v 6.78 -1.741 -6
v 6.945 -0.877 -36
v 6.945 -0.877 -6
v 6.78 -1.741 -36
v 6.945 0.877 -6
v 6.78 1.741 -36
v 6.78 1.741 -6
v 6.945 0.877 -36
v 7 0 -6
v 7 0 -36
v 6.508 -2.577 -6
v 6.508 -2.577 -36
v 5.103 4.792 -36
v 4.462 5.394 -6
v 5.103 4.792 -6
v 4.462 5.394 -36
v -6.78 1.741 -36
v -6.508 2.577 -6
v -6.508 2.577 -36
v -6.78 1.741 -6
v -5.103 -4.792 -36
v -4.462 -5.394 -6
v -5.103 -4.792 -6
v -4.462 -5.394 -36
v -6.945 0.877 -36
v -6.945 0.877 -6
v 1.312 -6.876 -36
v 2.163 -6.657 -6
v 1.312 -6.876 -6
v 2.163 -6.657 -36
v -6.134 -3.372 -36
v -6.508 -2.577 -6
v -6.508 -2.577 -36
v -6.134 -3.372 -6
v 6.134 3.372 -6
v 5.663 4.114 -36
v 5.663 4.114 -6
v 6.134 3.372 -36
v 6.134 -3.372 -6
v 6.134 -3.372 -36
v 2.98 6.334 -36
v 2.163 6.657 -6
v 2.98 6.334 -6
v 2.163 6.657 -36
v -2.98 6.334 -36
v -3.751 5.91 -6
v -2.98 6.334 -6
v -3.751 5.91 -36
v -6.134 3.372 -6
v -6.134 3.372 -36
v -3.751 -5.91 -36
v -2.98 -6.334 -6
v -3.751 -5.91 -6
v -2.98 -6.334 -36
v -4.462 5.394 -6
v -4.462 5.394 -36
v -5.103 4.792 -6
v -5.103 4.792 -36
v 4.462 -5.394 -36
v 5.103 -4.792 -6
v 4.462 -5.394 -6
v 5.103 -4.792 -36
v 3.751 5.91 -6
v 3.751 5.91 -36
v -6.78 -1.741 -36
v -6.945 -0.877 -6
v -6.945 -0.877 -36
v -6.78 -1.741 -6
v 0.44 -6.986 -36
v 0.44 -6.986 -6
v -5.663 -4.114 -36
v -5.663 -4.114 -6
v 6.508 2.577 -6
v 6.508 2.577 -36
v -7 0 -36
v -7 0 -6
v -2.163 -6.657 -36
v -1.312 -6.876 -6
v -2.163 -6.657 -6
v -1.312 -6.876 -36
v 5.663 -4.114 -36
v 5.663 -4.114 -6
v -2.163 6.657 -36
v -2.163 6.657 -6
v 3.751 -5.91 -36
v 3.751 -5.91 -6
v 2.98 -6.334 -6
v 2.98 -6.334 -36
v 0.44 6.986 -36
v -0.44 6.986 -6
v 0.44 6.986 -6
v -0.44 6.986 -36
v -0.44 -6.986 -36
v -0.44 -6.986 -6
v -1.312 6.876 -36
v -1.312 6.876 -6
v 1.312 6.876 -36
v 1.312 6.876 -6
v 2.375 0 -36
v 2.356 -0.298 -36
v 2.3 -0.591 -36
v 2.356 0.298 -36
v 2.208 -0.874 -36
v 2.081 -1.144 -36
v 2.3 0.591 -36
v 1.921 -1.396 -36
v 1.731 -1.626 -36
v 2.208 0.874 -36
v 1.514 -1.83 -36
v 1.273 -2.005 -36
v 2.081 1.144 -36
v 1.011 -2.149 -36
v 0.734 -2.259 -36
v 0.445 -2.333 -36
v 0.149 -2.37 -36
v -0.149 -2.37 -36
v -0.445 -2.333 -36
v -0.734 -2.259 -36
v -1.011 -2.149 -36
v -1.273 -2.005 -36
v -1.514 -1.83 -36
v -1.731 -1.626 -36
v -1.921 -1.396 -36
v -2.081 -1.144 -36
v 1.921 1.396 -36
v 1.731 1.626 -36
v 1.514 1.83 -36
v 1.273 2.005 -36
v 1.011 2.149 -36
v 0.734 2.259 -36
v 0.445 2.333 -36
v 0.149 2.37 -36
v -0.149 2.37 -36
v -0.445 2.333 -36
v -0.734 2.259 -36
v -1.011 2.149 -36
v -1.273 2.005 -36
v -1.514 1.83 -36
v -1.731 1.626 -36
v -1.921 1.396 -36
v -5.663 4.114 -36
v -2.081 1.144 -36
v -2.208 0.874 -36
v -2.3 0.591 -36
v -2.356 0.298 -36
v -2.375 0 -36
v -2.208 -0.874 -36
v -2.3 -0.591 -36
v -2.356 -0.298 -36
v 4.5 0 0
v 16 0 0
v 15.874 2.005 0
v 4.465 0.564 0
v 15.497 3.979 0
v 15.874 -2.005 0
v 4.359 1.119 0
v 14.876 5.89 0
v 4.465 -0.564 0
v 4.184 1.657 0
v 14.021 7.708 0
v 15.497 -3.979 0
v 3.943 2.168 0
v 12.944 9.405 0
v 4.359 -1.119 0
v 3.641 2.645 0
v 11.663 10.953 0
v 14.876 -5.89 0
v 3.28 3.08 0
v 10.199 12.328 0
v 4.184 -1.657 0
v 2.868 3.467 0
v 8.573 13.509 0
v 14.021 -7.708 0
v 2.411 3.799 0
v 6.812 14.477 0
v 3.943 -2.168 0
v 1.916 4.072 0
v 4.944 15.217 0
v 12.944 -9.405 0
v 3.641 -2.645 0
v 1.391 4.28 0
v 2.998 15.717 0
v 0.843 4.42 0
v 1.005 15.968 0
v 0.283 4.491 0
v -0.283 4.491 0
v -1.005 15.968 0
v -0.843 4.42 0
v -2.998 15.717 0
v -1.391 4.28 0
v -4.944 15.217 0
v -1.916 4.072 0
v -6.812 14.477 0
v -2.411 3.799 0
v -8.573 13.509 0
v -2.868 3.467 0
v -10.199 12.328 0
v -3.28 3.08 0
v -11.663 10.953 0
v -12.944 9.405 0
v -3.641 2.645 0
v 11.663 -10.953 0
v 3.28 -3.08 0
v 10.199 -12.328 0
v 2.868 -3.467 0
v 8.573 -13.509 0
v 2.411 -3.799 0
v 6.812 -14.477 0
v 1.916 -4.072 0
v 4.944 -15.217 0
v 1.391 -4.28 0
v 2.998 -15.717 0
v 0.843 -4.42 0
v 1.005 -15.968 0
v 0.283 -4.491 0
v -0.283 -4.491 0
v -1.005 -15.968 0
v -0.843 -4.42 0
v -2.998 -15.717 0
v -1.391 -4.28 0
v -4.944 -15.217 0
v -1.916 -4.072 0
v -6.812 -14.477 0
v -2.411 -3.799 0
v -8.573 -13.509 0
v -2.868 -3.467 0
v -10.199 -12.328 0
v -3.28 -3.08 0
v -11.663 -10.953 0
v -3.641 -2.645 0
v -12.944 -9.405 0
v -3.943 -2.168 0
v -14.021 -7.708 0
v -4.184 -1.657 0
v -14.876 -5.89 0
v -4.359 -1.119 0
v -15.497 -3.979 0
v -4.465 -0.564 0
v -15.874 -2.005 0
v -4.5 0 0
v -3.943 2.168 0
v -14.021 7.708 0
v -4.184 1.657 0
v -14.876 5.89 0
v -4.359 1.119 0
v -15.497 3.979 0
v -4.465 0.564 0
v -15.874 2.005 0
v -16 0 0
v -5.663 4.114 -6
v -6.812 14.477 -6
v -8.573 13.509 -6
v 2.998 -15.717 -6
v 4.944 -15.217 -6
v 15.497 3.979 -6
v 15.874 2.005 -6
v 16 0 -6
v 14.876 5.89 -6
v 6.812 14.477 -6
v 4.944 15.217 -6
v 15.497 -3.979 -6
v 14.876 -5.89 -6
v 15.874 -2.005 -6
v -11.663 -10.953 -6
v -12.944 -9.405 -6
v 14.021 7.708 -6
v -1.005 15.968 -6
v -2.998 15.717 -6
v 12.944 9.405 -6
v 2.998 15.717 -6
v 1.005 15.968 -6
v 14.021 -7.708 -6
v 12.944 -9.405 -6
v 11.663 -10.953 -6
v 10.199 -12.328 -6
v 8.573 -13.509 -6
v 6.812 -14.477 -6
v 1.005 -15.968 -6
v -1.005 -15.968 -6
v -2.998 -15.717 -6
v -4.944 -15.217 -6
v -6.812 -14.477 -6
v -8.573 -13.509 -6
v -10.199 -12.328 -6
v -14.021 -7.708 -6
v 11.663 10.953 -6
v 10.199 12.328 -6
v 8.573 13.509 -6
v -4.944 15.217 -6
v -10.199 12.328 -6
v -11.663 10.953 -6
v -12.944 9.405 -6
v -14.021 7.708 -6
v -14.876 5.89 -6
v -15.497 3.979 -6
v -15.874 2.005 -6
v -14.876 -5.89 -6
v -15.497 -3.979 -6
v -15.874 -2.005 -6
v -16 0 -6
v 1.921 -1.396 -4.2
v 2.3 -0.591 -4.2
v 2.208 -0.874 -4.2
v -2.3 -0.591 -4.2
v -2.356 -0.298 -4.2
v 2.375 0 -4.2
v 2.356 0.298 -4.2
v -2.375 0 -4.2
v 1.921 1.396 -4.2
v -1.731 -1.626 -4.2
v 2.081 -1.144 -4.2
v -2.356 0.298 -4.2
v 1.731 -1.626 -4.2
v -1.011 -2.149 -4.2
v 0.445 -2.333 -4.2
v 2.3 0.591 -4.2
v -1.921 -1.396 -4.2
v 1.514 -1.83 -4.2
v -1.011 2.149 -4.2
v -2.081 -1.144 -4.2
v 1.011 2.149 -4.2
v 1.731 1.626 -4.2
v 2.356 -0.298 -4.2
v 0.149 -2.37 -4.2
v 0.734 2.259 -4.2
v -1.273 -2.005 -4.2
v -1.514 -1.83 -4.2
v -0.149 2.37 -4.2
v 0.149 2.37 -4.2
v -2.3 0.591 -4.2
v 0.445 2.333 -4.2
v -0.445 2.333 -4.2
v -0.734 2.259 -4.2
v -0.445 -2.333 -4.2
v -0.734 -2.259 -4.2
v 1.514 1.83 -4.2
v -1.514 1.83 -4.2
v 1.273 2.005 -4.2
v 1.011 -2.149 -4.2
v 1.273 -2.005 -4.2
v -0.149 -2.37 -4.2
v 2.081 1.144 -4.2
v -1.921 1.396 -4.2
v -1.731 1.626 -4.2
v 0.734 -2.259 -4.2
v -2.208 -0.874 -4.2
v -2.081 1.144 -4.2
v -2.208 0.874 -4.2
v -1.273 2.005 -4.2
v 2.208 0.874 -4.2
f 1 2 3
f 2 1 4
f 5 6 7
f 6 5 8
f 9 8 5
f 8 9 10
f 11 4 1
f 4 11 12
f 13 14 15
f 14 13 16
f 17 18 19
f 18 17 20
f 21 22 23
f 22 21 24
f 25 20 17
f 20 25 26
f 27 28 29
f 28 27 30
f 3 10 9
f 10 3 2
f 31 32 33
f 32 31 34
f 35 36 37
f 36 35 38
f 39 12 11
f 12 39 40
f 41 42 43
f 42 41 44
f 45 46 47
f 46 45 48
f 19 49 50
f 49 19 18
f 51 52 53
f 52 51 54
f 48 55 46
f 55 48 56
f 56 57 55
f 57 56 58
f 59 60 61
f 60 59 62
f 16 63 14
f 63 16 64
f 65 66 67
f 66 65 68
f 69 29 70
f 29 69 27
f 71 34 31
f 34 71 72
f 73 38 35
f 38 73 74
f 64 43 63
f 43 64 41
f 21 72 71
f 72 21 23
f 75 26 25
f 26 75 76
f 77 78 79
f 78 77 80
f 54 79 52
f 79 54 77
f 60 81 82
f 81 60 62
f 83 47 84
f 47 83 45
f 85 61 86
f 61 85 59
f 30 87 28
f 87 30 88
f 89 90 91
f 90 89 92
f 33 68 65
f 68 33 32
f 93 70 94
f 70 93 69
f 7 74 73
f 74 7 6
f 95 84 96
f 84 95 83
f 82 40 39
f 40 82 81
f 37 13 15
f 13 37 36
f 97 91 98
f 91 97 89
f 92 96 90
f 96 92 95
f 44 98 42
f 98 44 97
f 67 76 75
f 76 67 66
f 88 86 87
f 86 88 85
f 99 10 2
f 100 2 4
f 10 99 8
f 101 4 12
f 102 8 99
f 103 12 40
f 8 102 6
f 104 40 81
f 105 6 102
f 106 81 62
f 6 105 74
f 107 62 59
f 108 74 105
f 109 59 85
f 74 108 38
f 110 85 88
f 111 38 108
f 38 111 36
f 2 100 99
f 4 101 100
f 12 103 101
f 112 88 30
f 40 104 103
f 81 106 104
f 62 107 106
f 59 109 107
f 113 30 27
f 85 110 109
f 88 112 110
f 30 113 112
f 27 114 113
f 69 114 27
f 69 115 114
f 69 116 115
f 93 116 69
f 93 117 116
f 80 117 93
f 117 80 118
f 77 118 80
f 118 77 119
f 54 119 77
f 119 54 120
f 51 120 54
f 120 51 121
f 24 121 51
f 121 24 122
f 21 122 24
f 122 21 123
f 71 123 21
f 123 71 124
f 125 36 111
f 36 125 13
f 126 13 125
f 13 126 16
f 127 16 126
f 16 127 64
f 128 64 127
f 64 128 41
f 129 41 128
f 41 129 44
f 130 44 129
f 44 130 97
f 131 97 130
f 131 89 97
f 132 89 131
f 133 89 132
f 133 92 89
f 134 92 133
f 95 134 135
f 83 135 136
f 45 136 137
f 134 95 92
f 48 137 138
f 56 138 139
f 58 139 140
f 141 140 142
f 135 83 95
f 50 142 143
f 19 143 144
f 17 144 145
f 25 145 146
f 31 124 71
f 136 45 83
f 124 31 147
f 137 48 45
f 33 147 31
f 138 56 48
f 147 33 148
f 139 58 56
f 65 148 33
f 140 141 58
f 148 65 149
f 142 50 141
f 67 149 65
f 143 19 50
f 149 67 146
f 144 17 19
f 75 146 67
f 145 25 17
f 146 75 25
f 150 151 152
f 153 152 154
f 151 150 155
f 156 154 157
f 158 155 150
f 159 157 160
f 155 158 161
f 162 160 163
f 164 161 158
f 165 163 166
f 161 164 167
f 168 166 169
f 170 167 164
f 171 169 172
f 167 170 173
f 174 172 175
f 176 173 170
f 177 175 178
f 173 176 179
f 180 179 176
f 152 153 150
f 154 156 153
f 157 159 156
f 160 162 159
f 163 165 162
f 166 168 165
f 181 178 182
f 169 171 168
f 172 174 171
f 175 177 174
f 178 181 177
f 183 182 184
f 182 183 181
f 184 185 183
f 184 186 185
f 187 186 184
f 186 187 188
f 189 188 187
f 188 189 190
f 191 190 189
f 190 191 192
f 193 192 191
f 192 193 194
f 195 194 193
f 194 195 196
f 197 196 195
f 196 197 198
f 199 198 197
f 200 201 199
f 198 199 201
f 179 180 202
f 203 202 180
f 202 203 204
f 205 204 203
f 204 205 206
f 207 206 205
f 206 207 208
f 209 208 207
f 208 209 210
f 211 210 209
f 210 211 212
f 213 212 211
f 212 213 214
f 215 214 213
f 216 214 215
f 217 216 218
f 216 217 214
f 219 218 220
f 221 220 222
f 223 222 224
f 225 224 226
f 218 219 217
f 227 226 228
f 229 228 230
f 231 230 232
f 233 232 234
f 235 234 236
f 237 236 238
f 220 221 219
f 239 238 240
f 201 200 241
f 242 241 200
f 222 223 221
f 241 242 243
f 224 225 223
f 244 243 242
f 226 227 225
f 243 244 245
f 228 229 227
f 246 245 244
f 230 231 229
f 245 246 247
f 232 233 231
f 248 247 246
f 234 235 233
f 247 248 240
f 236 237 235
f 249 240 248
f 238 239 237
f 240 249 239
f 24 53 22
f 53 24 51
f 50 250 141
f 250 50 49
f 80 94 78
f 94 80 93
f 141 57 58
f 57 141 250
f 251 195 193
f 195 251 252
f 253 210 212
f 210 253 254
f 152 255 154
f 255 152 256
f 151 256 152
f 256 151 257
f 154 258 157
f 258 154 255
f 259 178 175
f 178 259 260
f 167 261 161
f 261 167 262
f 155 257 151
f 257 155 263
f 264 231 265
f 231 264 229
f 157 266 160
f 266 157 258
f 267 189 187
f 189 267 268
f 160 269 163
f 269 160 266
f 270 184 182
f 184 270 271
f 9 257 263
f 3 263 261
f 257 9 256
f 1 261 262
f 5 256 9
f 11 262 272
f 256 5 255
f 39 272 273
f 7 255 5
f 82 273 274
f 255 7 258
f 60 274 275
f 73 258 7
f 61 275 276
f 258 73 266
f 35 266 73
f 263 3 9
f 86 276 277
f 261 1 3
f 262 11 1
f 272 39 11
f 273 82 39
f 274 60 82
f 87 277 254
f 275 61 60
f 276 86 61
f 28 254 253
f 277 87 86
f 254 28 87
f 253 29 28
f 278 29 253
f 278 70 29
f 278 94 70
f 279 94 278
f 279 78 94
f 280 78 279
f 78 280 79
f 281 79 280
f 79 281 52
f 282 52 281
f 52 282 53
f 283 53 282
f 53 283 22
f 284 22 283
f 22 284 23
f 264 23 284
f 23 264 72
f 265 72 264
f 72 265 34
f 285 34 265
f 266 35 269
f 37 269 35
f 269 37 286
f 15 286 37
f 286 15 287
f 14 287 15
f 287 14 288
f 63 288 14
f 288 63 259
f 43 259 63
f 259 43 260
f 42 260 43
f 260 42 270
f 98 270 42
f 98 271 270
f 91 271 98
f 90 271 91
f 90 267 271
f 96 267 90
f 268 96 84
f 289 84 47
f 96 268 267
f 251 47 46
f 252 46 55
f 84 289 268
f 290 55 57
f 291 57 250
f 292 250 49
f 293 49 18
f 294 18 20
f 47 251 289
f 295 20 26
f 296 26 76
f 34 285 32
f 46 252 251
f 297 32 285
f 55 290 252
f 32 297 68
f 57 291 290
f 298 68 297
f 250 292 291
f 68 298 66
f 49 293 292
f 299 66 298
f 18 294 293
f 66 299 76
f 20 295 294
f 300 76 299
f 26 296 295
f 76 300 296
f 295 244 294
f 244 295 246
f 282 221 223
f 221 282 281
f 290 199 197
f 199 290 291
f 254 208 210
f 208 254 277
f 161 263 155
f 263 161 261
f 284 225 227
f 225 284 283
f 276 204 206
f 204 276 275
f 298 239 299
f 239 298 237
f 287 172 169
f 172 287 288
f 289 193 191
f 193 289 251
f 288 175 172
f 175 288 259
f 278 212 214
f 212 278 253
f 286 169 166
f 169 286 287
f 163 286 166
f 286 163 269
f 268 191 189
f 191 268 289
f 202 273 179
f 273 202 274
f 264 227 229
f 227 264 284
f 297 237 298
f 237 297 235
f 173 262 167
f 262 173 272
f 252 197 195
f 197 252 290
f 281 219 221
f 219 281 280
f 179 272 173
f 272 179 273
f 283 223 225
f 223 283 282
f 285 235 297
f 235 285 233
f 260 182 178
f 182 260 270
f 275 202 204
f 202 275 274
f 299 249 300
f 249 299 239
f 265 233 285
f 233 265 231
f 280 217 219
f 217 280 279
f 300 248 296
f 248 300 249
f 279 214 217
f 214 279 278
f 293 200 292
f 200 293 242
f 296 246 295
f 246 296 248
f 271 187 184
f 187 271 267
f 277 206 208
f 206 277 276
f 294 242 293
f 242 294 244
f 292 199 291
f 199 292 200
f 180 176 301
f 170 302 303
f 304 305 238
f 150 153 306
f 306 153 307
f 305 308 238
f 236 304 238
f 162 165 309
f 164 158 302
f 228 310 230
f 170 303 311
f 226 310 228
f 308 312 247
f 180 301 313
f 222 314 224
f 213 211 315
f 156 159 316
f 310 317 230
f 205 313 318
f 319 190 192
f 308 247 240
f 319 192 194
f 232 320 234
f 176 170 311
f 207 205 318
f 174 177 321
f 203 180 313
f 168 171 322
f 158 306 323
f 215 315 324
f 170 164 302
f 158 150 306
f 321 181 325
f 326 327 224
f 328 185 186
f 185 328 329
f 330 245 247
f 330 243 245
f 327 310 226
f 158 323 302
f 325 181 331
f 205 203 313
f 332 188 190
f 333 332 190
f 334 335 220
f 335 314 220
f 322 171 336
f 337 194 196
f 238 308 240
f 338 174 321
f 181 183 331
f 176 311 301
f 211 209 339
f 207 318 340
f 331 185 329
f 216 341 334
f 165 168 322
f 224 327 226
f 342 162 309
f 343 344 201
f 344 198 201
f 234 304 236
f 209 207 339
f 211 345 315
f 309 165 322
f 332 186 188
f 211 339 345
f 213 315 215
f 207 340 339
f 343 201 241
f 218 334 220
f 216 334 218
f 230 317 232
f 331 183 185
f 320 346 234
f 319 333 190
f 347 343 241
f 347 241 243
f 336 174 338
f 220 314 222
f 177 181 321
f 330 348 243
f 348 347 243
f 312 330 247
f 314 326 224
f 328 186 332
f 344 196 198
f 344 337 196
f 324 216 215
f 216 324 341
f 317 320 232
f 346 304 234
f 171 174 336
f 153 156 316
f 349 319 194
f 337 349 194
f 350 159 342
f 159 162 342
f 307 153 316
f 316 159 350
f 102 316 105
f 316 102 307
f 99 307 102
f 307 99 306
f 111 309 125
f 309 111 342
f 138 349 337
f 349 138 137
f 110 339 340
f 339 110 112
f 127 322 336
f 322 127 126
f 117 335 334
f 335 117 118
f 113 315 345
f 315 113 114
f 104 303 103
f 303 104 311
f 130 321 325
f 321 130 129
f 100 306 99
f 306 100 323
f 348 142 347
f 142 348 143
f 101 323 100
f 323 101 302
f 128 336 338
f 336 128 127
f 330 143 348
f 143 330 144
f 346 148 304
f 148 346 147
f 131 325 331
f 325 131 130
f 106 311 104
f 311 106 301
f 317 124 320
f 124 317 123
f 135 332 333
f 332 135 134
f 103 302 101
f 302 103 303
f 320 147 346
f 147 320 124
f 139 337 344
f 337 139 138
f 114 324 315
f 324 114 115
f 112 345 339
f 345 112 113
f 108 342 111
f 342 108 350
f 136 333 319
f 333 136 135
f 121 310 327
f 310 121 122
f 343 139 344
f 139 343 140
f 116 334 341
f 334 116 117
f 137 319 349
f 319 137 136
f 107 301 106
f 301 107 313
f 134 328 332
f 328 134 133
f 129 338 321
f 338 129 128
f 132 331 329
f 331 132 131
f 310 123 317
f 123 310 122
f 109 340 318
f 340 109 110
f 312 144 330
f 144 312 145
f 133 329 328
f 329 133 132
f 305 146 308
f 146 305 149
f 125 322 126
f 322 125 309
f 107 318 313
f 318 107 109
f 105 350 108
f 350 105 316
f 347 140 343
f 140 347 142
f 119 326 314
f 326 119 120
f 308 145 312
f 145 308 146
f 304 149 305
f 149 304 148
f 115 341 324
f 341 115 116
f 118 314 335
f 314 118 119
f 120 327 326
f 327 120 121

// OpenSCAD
$fn = 50;


difference() {
	union() {
		translate(v = [0, 0, -36.0000000000]) {
			cylinder(h = 36, r = 7.0000000000);
		}
		translate(v = [0, 0, -6.0000000000]) {
			cylinder(h = 6, r = 16.0000000000);
		}
	}
	union() {
		translate(v = [0, 0, 0]) {
			rotate(a = [0, 0, 0]) {
				difference() {
					union() {
						#translate(v = [0, 0, -36.0000000000]) {
							cylinder(h = 36, r = 2.2500000000);
						}
						#translate(v = [0, 0, -4.2000000000]) {
							cylinder(h = 4.2000000000, r1 = 2.3750000000, r2 = 4.5000000000);
						}
						#translate(v = [0, 0, -36.0000000000]) {
							cylinder(h = 36, r = 2.3750000000);
						}
						#translate(v = [0, 0, -36.0000000000]) {
							cylinder(h = 36, r = 2.2500000000);
						}
					}
					union();
				}
			}
		}
	}
}
